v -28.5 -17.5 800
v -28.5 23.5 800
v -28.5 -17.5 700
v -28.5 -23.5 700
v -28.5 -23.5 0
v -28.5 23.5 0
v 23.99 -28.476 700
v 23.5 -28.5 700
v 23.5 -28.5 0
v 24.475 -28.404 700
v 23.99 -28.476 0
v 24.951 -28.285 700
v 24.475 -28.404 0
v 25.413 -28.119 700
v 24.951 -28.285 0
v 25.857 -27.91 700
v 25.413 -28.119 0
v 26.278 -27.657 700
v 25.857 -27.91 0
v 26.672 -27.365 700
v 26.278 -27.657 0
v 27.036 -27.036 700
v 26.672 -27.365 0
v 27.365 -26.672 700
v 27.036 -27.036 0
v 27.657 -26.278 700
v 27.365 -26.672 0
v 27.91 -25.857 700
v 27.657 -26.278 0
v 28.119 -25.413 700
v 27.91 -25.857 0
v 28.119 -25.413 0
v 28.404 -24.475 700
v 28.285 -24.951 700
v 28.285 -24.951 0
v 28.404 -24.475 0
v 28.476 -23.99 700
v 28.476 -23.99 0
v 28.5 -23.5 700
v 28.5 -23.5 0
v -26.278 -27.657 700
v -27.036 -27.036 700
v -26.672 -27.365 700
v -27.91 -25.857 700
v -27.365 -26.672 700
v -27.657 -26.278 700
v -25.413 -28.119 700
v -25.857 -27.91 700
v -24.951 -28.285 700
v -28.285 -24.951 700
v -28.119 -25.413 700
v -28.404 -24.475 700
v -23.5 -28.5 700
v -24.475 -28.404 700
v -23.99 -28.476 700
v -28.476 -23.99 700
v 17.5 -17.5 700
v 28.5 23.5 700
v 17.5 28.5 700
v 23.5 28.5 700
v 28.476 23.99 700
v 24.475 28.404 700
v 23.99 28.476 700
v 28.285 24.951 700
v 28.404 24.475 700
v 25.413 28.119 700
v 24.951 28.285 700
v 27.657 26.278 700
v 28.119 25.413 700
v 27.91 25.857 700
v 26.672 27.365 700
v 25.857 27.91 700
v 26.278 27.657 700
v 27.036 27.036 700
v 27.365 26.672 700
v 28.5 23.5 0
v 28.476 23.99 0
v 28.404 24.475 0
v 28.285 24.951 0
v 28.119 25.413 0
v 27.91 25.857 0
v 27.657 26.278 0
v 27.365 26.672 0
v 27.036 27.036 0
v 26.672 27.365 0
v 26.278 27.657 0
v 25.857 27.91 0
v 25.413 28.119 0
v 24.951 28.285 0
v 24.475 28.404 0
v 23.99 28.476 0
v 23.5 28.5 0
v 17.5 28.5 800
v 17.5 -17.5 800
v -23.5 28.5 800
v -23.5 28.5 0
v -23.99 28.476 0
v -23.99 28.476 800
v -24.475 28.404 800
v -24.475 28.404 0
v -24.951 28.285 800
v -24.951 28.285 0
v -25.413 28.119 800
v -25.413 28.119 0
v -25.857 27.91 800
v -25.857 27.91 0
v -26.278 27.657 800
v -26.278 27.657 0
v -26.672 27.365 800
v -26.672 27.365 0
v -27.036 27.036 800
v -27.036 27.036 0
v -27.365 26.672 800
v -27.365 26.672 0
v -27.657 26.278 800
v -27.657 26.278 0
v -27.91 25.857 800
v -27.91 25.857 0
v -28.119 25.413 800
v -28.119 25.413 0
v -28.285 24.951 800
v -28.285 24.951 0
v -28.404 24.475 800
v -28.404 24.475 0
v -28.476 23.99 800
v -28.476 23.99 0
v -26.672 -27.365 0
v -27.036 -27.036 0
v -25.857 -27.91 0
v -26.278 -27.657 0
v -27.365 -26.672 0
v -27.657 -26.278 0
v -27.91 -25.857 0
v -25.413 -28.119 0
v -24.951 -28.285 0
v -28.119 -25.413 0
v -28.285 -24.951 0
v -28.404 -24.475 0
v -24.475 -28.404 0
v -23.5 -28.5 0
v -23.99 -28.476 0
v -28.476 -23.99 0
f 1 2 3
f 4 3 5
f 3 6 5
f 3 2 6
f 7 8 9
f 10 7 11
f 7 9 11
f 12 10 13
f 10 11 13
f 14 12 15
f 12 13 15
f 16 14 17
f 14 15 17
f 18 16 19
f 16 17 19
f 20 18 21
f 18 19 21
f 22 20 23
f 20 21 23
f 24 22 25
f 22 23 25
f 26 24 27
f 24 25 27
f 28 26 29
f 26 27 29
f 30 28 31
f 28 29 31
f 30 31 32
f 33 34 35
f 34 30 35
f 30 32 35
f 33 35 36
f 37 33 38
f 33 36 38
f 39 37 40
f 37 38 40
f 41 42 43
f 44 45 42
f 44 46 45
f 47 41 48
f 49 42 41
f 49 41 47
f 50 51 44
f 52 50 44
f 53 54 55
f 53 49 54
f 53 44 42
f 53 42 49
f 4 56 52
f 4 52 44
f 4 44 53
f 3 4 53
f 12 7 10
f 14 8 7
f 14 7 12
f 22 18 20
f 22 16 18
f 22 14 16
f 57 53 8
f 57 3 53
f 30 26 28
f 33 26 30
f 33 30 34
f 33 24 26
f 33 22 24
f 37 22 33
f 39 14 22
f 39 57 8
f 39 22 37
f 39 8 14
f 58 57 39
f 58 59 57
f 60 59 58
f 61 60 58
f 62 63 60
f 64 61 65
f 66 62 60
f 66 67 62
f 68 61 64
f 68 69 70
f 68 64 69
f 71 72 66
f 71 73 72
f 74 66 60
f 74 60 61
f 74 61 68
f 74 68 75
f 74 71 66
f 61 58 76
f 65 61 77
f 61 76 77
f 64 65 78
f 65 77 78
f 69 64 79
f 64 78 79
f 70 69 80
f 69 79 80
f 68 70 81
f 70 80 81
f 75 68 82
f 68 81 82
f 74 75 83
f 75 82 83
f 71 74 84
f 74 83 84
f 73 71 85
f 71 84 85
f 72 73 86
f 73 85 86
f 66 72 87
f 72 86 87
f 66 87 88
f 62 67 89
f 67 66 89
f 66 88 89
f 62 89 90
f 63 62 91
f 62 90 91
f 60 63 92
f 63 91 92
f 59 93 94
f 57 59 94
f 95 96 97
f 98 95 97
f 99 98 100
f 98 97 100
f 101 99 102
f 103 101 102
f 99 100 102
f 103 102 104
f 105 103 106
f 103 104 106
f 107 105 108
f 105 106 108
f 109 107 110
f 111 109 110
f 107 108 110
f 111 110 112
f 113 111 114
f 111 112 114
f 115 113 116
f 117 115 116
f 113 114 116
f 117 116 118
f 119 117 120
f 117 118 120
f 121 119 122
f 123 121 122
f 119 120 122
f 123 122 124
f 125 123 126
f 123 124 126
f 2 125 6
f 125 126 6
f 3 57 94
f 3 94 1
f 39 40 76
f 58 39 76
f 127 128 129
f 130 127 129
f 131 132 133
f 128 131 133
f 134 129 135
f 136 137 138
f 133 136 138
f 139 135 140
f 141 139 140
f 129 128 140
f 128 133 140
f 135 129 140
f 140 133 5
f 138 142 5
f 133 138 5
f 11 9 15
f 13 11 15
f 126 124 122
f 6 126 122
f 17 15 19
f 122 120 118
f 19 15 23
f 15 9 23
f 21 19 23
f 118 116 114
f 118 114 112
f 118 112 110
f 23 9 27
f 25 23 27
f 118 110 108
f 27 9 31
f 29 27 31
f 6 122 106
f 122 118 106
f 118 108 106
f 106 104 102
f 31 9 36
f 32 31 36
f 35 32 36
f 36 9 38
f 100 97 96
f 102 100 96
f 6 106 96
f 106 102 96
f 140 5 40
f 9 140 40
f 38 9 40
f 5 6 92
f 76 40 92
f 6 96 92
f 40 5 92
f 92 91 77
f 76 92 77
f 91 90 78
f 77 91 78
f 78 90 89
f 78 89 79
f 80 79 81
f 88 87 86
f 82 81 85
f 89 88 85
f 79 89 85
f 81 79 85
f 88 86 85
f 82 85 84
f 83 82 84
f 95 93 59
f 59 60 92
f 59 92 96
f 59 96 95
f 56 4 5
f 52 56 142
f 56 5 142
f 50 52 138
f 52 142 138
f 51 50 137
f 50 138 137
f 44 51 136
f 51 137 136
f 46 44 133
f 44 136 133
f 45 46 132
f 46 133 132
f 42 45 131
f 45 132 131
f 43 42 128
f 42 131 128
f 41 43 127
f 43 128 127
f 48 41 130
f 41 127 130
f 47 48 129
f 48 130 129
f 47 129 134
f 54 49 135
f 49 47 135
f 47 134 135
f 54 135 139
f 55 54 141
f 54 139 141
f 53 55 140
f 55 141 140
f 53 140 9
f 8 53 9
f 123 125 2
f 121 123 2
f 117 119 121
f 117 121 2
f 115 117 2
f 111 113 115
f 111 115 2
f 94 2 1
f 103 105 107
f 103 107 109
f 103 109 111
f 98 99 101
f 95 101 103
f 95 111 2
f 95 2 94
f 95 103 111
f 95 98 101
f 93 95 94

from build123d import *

# Parameters (mm, degrees)
F1_DEPTH = 800
F3_DEPTH = 100


with BuildPart() as f1:
    # F0 (on Top) → F1 (new body)
    with BuildSketch(Plane.XY):
        with BuildLine():
            Line((23.5, 28.5), (-23.5, 28.5))
            ThreePointArc((-23.5, 28.5), (-27.035534, 27.035534), (-28.5, 23.5))
            Line((-28.5, 23.5), (-28.5, -23.5))
            ThreePointArc((-28.5, -23.5), (-27.035534, -27.035534), (-23.5, -28.5))
            Line((-23.5, -28.5), (23.5, -28.5))
            ThreePointArc((23.5, -28.5), (27.035534, -27.035534), (28.5, -23.5))
            Line((28.5, -23.5), (28.5, 23.5))
            ThreePointArc((28.5, 23.5), (27.035534, 27.035534), (23.5, 28.5))
        make_face()
    extrude(amount=F1_DEPTH)

    # F2 (on face) → F3 (cut)
    with BuildSketch(Plane.XY.offset(800)):
        Polygon((-35.619496, -17.5), (-35.619496, -32.5), (32.5, -32.5), (32.5, 34.954965), (17.5, 34.954965), (17.5, -17.5), align=None)
    extrude(amount=-F3_DEPTH, mode=Mode.SUBTRACT)


solid = f1.part
